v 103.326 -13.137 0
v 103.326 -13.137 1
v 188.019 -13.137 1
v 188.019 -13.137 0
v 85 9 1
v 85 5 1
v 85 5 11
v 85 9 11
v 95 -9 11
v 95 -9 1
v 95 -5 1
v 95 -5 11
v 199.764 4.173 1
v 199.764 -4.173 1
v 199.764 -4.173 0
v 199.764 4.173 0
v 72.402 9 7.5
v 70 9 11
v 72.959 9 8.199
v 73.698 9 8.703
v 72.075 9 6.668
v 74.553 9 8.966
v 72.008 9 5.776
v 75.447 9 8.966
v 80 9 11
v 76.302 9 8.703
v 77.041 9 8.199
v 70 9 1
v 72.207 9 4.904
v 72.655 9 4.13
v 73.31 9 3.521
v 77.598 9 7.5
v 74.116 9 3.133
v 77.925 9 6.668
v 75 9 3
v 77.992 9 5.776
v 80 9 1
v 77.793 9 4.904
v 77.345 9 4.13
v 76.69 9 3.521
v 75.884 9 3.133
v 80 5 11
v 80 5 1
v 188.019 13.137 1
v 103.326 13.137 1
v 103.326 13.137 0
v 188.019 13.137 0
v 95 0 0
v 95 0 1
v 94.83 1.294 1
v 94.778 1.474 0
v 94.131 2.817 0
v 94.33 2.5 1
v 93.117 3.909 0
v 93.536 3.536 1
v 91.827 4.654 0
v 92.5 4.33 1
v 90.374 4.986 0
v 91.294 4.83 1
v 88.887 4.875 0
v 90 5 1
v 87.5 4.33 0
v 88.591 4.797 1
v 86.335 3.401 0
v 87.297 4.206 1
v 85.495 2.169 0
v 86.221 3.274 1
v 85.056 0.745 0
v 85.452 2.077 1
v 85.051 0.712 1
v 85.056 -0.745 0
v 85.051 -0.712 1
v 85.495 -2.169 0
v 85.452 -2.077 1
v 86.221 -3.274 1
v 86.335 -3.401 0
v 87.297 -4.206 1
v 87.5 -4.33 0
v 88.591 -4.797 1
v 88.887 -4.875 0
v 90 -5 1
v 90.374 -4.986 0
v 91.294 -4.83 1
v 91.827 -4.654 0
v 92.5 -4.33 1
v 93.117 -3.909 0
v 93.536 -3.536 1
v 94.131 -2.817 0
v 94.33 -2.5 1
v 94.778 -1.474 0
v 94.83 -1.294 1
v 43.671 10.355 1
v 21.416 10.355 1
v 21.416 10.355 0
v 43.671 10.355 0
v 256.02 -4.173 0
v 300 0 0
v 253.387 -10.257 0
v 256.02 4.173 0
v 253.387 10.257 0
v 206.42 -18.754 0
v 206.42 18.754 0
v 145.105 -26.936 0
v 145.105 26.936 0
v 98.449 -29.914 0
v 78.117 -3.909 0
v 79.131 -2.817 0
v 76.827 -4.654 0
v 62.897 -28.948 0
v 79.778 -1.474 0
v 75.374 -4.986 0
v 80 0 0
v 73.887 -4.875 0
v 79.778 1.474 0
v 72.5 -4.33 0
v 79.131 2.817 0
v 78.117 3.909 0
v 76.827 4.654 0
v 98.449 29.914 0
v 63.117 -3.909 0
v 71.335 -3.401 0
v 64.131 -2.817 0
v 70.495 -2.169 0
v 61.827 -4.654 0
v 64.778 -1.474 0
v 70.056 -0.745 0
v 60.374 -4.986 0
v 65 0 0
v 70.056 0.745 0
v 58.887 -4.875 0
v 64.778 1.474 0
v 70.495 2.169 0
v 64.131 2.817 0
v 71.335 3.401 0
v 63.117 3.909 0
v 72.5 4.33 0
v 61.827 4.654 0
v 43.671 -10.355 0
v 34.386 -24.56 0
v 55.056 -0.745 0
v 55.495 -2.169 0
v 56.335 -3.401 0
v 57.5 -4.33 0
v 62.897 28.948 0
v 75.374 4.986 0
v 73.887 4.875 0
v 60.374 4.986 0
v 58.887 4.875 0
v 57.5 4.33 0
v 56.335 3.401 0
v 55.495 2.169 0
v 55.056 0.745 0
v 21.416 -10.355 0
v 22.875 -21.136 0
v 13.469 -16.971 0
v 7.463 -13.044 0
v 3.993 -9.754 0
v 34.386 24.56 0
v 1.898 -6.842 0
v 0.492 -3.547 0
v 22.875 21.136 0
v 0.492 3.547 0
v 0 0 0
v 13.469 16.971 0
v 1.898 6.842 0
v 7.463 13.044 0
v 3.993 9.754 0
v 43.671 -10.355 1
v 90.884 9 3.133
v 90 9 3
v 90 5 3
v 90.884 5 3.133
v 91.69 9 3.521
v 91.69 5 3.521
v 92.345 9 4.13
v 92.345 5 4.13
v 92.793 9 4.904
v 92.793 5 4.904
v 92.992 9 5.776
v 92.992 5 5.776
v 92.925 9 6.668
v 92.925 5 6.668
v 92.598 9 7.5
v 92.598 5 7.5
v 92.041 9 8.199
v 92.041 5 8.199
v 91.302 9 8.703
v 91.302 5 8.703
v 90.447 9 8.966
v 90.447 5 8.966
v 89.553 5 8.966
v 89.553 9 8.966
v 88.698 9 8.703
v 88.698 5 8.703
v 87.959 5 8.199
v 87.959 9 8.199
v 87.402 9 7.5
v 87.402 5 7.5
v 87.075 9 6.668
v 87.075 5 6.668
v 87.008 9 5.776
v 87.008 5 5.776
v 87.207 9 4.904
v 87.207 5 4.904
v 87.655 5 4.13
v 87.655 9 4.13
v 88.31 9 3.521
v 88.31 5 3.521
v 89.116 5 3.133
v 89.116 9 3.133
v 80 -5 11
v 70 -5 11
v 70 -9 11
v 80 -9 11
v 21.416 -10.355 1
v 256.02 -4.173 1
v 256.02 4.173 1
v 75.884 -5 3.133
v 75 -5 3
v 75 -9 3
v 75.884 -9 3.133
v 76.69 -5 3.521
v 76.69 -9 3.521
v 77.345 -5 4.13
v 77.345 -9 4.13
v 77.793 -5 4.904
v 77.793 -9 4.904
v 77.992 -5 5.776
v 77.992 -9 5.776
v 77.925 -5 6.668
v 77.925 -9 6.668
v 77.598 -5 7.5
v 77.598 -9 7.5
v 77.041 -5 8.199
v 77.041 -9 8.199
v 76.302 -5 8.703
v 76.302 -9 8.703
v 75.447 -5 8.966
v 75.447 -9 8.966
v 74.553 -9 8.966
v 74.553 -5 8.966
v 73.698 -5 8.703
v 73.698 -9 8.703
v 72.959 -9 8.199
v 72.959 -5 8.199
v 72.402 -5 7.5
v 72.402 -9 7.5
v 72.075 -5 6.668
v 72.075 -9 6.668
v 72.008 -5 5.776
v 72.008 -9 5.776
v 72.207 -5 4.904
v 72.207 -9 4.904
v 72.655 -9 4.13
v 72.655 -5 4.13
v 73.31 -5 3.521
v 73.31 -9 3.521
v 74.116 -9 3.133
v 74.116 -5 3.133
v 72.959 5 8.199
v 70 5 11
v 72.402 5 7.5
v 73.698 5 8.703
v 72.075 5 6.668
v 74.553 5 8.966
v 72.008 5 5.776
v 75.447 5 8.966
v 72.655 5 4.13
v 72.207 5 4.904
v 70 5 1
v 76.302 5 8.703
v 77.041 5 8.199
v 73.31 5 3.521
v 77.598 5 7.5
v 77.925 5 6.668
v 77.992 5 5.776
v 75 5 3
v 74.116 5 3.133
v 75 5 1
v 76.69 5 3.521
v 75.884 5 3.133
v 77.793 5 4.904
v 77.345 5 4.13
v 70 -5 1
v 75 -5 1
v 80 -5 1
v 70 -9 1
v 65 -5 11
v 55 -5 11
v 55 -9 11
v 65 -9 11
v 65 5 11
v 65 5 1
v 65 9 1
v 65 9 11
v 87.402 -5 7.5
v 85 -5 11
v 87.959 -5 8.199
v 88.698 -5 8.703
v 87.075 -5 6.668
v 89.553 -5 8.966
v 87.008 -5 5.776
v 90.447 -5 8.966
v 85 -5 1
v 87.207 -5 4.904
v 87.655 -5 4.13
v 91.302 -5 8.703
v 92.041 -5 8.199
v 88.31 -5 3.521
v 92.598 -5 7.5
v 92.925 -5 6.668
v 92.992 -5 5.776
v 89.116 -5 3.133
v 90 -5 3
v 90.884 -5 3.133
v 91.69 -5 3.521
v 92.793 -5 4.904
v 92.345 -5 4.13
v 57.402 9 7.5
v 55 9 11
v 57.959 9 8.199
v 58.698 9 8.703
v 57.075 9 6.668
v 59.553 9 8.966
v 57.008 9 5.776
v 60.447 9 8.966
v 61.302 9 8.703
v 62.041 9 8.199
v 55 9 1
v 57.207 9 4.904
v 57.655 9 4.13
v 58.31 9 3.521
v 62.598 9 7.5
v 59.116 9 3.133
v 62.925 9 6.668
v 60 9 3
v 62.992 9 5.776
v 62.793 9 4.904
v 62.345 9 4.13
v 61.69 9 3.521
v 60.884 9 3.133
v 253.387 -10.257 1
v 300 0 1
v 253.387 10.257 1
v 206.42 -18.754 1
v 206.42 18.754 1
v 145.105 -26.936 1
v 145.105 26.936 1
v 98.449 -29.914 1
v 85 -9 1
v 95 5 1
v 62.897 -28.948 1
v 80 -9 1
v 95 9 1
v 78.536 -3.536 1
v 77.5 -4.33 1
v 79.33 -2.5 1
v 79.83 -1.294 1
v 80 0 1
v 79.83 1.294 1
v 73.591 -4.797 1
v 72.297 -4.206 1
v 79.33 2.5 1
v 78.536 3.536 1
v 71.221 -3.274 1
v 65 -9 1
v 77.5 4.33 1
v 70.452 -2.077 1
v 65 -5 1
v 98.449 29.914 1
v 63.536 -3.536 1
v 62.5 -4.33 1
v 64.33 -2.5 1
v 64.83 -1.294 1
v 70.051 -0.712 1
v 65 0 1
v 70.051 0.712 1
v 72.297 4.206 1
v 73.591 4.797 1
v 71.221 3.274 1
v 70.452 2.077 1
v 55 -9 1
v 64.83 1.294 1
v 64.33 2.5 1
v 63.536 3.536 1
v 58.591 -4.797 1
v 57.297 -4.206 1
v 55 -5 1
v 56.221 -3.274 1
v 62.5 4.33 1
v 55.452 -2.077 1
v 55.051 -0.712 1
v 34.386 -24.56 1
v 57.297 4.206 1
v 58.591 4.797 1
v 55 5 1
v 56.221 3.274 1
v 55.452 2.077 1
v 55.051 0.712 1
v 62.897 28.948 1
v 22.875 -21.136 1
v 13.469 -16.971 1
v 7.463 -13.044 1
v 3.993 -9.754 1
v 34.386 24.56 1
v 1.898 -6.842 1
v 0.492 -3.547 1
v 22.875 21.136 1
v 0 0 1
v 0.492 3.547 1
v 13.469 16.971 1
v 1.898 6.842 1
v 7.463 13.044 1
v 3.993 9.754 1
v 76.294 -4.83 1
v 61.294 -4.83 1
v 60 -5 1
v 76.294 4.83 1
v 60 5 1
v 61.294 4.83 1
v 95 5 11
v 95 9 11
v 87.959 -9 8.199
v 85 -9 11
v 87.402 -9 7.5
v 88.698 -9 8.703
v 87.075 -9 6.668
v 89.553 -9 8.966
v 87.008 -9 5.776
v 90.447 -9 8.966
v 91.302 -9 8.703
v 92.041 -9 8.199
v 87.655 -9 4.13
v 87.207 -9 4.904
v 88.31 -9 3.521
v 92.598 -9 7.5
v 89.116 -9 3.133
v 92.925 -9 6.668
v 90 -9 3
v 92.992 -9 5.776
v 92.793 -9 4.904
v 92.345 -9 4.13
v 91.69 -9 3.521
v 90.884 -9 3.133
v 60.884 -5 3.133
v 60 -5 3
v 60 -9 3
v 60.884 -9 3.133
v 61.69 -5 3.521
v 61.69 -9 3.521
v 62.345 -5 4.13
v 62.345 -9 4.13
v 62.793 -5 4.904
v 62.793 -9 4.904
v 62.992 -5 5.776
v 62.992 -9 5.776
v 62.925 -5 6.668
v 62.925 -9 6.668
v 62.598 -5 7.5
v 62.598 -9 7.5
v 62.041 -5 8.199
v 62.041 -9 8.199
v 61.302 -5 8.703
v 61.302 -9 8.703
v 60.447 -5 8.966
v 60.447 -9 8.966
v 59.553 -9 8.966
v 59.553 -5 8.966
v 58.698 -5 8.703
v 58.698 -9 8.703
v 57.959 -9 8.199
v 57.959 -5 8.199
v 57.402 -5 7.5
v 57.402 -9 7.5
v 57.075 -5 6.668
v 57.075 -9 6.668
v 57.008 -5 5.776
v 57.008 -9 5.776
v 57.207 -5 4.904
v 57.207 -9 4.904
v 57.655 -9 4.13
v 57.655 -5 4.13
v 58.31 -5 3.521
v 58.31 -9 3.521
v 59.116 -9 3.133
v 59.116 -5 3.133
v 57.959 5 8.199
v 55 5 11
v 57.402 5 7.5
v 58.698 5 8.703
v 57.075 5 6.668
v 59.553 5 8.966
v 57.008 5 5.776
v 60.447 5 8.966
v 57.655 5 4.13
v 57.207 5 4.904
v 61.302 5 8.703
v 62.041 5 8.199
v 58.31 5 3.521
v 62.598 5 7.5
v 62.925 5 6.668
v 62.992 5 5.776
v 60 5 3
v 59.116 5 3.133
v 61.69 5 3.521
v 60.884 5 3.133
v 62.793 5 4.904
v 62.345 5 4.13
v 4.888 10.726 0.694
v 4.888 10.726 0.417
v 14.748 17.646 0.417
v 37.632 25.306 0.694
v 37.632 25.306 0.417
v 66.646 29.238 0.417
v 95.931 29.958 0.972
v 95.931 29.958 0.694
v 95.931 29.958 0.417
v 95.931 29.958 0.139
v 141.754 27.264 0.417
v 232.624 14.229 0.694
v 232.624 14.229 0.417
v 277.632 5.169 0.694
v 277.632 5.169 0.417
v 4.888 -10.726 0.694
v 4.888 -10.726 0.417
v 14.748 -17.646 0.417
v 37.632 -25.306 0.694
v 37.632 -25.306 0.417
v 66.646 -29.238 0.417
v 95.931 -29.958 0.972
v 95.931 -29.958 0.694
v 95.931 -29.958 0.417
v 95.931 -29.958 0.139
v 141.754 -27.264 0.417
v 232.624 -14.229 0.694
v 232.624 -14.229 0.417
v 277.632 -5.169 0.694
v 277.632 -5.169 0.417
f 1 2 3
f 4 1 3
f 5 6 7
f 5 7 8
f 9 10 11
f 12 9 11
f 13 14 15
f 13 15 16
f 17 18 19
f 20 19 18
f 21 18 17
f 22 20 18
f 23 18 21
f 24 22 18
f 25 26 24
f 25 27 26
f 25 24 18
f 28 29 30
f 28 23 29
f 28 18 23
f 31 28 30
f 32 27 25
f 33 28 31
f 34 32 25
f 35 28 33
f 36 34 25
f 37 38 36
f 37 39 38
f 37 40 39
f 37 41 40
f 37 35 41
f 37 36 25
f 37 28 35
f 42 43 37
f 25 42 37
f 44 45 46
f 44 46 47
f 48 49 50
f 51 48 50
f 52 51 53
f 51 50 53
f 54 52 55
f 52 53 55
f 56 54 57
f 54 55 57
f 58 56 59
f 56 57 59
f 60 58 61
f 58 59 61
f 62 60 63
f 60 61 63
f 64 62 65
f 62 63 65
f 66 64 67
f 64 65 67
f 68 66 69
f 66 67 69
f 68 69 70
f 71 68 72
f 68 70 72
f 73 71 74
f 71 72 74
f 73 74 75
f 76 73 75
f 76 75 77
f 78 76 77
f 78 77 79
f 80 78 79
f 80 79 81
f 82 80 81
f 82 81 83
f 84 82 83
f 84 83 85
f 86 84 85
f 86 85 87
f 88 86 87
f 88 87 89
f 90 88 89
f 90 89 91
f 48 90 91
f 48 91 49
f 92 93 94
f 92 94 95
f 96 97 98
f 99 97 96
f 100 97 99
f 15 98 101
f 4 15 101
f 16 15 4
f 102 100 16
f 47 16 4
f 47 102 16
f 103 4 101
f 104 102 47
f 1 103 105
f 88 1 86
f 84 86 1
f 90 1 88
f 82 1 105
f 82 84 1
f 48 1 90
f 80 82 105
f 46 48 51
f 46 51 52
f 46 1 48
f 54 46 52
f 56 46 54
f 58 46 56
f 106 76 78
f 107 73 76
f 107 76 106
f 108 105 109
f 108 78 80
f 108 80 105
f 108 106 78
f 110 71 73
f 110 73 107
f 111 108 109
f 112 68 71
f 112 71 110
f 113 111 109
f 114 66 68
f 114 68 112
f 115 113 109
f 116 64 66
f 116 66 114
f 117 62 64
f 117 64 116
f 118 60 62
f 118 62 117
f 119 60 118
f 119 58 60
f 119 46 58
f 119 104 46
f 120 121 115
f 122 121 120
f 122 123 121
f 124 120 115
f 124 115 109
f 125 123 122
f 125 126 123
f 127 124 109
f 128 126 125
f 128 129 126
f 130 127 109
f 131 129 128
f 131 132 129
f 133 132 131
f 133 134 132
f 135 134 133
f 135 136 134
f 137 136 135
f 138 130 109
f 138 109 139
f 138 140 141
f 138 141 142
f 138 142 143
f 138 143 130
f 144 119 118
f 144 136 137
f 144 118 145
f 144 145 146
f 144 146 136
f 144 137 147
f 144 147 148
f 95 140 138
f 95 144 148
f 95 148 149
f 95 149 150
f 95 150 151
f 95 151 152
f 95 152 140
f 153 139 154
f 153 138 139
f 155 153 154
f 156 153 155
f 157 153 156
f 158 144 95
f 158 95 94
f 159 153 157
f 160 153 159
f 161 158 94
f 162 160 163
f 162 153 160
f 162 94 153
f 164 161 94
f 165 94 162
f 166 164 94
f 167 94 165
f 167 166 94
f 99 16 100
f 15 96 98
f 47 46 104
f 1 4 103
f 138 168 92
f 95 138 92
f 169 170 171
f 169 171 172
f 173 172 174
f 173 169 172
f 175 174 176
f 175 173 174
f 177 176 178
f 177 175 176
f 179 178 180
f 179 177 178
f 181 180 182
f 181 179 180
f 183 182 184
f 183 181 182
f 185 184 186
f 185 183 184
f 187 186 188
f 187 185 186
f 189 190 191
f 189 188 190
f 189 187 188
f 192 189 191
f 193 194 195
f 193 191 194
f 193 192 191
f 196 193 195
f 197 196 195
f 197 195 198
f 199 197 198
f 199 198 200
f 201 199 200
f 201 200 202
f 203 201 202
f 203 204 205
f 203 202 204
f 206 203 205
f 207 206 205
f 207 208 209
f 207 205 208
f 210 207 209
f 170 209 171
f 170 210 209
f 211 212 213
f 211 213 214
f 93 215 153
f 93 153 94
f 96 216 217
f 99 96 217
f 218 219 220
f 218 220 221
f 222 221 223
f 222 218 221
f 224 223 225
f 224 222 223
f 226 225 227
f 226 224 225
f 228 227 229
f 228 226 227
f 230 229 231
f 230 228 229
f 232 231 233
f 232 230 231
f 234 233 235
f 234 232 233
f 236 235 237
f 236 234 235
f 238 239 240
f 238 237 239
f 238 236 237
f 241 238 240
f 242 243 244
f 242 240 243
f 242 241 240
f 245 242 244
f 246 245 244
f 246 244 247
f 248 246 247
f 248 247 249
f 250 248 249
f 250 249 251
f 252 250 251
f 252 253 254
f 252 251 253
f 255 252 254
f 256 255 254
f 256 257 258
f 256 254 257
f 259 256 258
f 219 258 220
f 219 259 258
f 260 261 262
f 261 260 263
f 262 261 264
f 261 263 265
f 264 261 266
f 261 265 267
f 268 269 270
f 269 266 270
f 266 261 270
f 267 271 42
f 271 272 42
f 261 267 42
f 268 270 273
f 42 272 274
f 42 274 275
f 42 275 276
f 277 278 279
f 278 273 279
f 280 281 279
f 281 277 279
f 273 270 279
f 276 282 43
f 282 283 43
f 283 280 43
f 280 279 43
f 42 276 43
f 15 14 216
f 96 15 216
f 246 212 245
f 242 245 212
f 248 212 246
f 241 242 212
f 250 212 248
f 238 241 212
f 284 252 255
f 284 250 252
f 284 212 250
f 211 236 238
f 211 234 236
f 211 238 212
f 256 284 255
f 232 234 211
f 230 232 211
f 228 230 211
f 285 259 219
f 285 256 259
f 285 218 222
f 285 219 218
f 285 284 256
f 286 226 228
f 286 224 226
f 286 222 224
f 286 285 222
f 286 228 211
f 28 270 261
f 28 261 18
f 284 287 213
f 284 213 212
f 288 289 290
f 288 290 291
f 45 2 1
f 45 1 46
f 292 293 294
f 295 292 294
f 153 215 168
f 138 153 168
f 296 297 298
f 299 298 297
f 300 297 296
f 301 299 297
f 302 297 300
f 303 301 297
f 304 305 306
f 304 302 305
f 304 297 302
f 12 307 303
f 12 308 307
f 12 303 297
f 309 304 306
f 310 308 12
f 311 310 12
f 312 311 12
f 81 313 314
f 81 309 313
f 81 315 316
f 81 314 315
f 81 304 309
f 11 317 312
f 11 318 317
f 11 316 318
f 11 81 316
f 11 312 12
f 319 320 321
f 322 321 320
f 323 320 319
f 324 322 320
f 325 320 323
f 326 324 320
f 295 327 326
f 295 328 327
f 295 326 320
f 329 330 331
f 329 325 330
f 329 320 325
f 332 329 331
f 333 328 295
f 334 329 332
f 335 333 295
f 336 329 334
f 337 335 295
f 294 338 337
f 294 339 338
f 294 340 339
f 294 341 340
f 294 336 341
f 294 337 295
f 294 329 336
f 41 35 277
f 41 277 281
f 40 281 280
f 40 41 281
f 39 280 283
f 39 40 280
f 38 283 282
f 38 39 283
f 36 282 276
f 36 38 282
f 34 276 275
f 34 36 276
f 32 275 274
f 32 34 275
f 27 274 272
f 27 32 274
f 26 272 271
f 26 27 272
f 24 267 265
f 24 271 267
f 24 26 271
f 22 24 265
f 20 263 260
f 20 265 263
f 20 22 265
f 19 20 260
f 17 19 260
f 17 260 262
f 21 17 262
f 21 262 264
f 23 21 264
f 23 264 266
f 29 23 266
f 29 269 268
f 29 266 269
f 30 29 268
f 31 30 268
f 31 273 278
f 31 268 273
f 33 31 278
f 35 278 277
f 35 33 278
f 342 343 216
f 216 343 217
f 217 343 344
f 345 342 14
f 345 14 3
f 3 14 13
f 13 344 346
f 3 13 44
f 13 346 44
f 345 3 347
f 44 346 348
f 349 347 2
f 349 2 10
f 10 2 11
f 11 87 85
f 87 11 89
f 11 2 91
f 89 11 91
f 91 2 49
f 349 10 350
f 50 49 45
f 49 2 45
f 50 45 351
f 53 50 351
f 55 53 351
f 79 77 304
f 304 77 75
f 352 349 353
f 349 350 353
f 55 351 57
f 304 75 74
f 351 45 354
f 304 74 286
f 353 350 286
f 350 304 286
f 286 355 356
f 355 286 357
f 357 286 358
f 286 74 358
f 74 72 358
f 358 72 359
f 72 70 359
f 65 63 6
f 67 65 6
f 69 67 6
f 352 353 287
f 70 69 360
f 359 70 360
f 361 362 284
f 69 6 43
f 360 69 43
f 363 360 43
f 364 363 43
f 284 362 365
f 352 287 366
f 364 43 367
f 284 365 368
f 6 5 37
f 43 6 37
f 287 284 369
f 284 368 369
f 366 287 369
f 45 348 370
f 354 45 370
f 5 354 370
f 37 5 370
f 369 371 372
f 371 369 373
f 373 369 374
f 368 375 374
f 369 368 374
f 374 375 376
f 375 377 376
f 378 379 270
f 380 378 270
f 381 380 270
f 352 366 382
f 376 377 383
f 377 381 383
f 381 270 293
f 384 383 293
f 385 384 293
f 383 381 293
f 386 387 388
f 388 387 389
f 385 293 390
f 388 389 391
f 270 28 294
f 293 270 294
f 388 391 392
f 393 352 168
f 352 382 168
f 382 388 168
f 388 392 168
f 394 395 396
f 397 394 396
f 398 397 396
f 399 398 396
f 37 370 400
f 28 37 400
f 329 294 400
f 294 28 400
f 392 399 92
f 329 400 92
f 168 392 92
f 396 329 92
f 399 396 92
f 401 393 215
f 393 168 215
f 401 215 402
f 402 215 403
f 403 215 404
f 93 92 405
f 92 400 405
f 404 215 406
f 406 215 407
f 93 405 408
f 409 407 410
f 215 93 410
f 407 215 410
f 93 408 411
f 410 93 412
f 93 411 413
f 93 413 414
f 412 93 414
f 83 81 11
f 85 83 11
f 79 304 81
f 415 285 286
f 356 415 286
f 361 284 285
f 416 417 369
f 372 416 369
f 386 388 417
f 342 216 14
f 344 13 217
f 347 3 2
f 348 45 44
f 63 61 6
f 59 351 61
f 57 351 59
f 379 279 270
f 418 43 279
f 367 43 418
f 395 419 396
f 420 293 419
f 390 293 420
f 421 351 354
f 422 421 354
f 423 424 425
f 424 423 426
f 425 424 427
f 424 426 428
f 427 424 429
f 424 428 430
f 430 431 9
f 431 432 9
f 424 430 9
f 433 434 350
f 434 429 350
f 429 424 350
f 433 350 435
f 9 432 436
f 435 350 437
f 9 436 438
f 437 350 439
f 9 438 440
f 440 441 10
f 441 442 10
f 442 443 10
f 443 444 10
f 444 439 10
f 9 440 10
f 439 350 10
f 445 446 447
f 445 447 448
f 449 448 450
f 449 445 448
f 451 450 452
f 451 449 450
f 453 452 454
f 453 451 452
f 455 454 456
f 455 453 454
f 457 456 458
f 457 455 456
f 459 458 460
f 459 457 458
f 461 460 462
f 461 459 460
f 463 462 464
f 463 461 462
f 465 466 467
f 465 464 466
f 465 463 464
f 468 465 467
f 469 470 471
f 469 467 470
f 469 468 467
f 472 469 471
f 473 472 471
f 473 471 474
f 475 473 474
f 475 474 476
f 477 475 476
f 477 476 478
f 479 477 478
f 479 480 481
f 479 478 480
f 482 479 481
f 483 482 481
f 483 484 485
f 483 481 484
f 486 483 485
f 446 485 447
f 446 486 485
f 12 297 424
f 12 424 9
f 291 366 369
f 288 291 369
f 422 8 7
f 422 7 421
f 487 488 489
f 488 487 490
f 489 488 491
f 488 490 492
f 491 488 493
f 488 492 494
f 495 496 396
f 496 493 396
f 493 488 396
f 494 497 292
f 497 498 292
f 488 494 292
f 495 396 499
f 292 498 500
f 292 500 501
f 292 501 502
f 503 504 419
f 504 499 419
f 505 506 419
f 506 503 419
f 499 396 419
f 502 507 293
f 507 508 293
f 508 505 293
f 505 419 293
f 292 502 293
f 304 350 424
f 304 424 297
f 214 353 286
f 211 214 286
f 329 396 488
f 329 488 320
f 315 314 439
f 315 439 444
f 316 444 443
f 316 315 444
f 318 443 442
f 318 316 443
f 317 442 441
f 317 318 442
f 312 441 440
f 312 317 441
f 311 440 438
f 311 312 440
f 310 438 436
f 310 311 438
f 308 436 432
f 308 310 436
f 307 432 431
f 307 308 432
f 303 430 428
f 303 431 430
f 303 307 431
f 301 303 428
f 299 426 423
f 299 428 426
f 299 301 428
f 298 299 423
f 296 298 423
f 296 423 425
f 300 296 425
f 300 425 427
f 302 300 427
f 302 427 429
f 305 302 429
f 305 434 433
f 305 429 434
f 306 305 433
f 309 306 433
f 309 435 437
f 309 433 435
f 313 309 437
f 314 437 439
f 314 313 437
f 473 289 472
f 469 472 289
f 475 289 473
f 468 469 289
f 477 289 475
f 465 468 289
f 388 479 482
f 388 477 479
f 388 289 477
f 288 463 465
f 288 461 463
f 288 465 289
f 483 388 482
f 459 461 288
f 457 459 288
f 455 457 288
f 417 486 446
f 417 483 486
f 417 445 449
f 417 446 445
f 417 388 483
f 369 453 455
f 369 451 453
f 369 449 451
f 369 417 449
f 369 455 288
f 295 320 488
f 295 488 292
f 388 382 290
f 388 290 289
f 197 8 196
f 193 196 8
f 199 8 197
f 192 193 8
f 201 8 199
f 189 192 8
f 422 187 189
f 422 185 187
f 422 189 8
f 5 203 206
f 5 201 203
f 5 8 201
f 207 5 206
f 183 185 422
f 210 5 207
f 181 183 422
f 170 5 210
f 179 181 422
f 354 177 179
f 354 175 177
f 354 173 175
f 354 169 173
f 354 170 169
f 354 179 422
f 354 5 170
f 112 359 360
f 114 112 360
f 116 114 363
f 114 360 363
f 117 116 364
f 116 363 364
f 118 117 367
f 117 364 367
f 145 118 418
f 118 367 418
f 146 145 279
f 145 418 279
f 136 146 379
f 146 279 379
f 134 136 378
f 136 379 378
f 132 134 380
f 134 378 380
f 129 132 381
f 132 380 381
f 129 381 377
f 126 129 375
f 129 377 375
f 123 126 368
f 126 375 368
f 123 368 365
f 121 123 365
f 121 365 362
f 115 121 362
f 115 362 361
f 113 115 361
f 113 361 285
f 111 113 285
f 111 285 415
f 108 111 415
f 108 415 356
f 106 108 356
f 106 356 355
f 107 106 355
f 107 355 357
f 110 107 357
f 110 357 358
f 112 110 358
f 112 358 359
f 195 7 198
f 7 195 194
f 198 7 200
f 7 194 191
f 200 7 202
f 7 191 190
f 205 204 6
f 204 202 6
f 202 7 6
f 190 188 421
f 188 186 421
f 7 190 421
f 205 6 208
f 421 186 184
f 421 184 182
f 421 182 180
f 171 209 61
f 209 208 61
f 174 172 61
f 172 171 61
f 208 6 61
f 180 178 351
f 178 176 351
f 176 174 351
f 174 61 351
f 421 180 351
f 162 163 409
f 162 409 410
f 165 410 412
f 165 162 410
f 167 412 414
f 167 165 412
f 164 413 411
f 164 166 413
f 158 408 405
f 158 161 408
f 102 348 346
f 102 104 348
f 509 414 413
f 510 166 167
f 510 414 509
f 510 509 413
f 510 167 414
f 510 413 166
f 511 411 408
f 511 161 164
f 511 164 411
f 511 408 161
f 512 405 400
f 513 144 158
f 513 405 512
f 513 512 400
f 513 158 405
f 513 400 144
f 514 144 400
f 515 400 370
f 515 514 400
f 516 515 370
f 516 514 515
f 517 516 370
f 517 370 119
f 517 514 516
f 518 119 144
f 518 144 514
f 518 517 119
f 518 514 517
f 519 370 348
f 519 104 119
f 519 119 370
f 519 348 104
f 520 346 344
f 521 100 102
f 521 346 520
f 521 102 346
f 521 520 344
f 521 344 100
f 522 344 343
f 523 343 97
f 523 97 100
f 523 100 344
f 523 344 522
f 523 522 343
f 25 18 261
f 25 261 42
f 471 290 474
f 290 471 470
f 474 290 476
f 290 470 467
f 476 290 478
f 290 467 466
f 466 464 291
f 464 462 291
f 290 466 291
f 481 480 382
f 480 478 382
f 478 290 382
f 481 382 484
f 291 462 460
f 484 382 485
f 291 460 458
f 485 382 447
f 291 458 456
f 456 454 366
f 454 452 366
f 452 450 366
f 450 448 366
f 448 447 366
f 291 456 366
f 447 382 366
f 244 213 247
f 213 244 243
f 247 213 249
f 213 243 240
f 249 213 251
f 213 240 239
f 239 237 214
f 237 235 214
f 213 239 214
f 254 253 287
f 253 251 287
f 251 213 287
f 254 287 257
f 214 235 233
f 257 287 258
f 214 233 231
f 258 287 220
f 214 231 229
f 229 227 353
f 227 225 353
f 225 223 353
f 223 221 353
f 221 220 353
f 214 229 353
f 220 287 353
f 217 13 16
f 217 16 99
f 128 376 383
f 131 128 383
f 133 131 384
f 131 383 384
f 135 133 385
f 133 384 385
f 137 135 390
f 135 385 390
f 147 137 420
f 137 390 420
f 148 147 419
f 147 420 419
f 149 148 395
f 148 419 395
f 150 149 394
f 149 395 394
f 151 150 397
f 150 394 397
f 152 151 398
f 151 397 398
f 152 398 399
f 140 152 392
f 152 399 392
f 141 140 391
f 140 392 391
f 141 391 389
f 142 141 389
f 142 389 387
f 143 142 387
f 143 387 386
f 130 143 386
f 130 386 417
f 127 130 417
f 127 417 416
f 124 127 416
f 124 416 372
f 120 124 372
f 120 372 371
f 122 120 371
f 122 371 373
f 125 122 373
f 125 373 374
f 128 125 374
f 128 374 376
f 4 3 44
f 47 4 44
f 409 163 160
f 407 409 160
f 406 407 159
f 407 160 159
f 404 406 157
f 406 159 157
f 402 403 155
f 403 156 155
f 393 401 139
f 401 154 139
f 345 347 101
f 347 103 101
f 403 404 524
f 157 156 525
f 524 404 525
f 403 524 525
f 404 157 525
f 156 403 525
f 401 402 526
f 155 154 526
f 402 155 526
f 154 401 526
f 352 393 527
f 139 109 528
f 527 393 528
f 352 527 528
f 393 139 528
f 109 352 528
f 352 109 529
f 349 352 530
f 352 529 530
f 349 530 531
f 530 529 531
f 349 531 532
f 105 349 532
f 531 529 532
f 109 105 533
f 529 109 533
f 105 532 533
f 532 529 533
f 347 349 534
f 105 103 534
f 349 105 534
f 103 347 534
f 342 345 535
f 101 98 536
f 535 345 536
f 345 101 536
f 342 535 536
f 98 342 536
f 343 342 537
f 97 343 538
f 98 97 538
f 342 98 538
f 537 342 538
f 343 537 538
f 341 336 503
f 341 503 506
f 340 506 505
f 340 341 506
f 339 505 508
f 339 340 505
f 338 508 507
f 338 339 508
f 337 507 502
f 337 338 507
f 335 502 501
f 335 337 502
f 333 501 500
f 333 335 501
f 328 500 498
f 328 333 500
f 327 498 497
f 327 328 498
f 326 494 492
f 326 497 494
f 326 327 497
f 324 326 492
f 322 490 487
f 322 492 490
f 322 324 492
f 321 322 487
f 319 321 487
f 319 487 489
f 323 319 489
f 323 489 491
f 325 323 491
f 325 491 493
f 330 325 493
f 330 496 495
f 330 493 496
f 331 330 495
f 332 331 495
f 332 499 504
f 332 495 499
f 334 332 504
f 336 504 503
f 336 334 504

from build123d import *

# Parameters (mm, degrees)
EXTRUDE_1_DEPTH          = 1
SKETCH_2_R               = 5
CUT_EXTRUDE_2_DEPTH      = 302.498287555
SKETCH_7_W               = 10
SKETCH_7_H               = 4
EXTRUDE_2_DEPTH          = 10
CUT_EXTRUDE_3_DEPTH      = 303.724763765
CUT_EXTRUDE_3_DEPTH_BACK = 303.724763765
SKETCH_8_R               = 3
SKETCH_9_W               = 84.692171331
SKETCH_9_H               = 26.273118844
SKETCH_9_W_2             = 56.255383877
SKETCH_9_H_2             = 8.345578926
SKETCH_9_W_3             = 22.254877138
SKETCH_9_H_3             = 20.70939956
CUT_EXTRUDE_4_DEPTH      = 302.662422914


with BuildPart() as part:
    # 草图1 → 凸台-拉伸1 (new body)
    with BuildSketch(Plane.XY):
        with BuildLine():
            add(Edge.make_bspline(
                [(0, 0), (-0.00021229, 0.506970744), (0.044864754, 1.381714413), (0.226017079, 2.650839475), (0.688025344, 4.299952552), (1.335546305, 5.873041675), (2.26695445, 7.542579189), (3.571946964, 9.346109572), (5.391381815, 11.324673938), (7.954469743, 13.539518757), (11.584975672, 16.021510412), (16.648123966, 18.726988569), (23.793189999, 21.649781435), (33.085765079, 24.436937203), (46.643058908, 27.284493785), (64.063199307, 29.362693495), (84.450847037, 30.260343335), (107.414943041, 29.859960777), (130.332556147, 28.428346139), (153.186136376, 26.214758658), (175.970846287, 23.391654718), (195.848592789, 20.487628812), (212.844945694, 17.732999103), (226.980485609, 15.27094618), (238.271313866, 13.203878393), (248.135151077, 11.310105462), (256.577305747, 9.625486685), (263.604664912, 8.179483676), (269.219788458, 6.997398786), (274.1309907, 5.93944771), (278.331979904, 5.017052178), (281.838528118, 4.234963306), (284.626645762, 3.606112196), (287.446648095, 2.96209323), (290.200347561, 2.326575377), (293.076089097, 1.653806717), (295.700233888, 1.034172197), (298.078453529, 0.464134201), (299.36547076, 0.153714708), (299.999999998, 0)],
                knots=[0, 0, 0, 0, 0, 0.005874531, 0.010168378, 0.014828146, 0.019835444, 0.025574736, 0.032308878, 0.040609511, 0.050966894, 0.064812119, 0.083253248, 0.107120705, 0.140429682, 0.177263566, 0.243881637, 0.310499708, 0.377117784, 0.443735861, 0.510353937, 0.576972013, 0.643590091, 0.67689913, 0.710208169, 0.743517207, 0.776826246, 0.793480766, 0.810135286, 0.826789806, 0.843444325, 0.851771585, 0.860098845, 0.868426105, 0.876753365, 0.885080625, 0.893407884, 0.901735144, 0.910062404, 0.910062404, 0.910062404, 0.910062404, 0.910062404], degree=4))
            add(Edge.make_bspline(
                [(0, 0), (-0.00021229, -0.506970744), (0.044864754, -1.381714413), (0.226017079, -2.650839475), (0.688025344, -4.299952552), (1.335546305, -5.873041675), (2.26695445, -7.542579189), (3.571946964, -9.346109572), (5.391381815, -11.324673938), (7.954469743, -13.539518757), (11.584975672, -16.021510412), (16.648123966, -18.726988569), (23.793189999, -21.649781435), (33.085765079, -24.436937203), (46.643058908, -27.284493785), (64.063199307, -29.362693495), (84.450847037, -30.260343335), (107.414943041, -29.859960777), (130.332556147, -28.428346139), (153.186136376, -26.214758658), (175.970846287, -23.391654718), (195.848592789, -20.487628812), (212.844945694, -17.732999103), (226.980485609, -15.27094618), (238.271313866, -13.203878393), (248.135151077, -11.310105462), (256.577305747, -9.625486685), (263.604664912, -8.179483676), (269.219788458, -6.997398786), (274.1309907, -5.93944771), (278.331979904, -5.017052178), (281.838528118, -4.234963306), (284.626645762, -3.606112196), (287.446648095, -2.96209323), (290.200347561, -2.326575377), (293.076089097, -1.653806717), (295.700233888, -1.034172197), (298.078453529, -0.464134201), (299.36547076, -0.153714708), (299.999999998, 0)],
                knots=[0, 0, 0, 0, 0, 0.005874531, 0.010168378, 0.014828146, 0.019835444, 0.025574736, 0.032308878, 0.040609511, 0.050966894, 0.064812119, 0.083253248, 0.107120705, 0.140429682, 0.177263566, 0.243881637, 0.310499708, 0.377117784, 0.443735861, 0.510353937, 0.576972013, 0.643590091, 0.67689913, 0.710208169, 0.743517207, 0.776826246, 0.793480766, 0.810135286, 0.826789806, 0.843444325, 0.851771585, 0.860098845, 0.868426105, 0.876753365, 0.885080625, 0.893407884, 0.901735144, 0.910062404, 0.910062404, 0.910062404, 0.910062404, 0.910062404], degree=4))
        make_face()
    extrude(amount=EXTRUDE_1_DEPTH)

    # 草图2 → 切除-拉伸2 (cut, through all)
    with BuildSketch(Plane.XY.offset(1)):
        with Locations((60, 0)):
            Circle(SKETCH_2_R)
        with Locations((75, 0)):
            Circle(SKETCH_2_R)
        with Locations((90, 0)):
            Circle(SKETCH_2_R)
    extrude(amount=-CUT_EXTRUDE_2_DEPTH, mode=Mode.SUBTRACT)

    # 草图7 → 凸台-拉伸2 (add)
    with BuildSketch(Plane.XY.offset(1)):
        with Locations((60, 7)):
            Rectangle(SKETCH_7_W, SKETCH_7_H)
        with Locations((60, -7)):
            Rectangle(SKETCH_7_W, SKETCH_7_H)
        with Locations((75, 7)):
            Rectangle(SKETCH_7_W, SKETCH_7_H)
        with Locations((75, -7)):
            Rectangle(SKETCH_7_W, SKETCH_7_H)
        with Locations((90, 7)):
            Rectangle(SKETCH_7_W, SKETCH_7_H)
        with Locations((90, -7)):
            Rectangle(SKETCH_7_W, SKETCH_7_H)
    extrude(amount=EXTRUDE_2_DEPTH)

    # 草图8 → 切除-拉伸3 (cut, two sides: drawn at the far end of the back side and taken through both)
    with BuildSketch(Plane.XZ.offset(9).offset(-CUT_EXTRUDE_3_DEPTH_BACK)):
        with Locations(Location((90, 6, 0), (0, 0, 270))):
            Circle(SKETCH_8_R)
        with Locations(Location((75, 6, 0), (0, 0, 270))):
            Circle(SKETCH_8_R)
        with Locations(Location((60, 6, 0), (0, 0, 270))):
            Circle(SKETCH_8_R)
    extrude(amount=CUT_EXTRUDE_3_DEPTH + CUT_EXTRUDE_3_DEPTH_BACK, mode=Mode.SUBTRACT)

    # 草图9 → 切除-拉伸4 (cut, through all)
    with BuildSketch(Plane.XY.offset(1)):
        with Locations((145.672556633, 0)):
            Rectangle(SKETCH_9_W, SKETCH_9_H)
        with Locations((227.891963838, 0)):
            Rectangle(SKETCH_9_W_2, SKETCH_9_H_2)
        with Locations((32.543597847, 0)):
            Rectangle(SKETCH_9_W_3, SKETCH_9_H_3)
    extrude(amount=-CUT_EXTRUDE_4_DEPTH, mode=Mode.SUBTRACT)


solid = part.part
